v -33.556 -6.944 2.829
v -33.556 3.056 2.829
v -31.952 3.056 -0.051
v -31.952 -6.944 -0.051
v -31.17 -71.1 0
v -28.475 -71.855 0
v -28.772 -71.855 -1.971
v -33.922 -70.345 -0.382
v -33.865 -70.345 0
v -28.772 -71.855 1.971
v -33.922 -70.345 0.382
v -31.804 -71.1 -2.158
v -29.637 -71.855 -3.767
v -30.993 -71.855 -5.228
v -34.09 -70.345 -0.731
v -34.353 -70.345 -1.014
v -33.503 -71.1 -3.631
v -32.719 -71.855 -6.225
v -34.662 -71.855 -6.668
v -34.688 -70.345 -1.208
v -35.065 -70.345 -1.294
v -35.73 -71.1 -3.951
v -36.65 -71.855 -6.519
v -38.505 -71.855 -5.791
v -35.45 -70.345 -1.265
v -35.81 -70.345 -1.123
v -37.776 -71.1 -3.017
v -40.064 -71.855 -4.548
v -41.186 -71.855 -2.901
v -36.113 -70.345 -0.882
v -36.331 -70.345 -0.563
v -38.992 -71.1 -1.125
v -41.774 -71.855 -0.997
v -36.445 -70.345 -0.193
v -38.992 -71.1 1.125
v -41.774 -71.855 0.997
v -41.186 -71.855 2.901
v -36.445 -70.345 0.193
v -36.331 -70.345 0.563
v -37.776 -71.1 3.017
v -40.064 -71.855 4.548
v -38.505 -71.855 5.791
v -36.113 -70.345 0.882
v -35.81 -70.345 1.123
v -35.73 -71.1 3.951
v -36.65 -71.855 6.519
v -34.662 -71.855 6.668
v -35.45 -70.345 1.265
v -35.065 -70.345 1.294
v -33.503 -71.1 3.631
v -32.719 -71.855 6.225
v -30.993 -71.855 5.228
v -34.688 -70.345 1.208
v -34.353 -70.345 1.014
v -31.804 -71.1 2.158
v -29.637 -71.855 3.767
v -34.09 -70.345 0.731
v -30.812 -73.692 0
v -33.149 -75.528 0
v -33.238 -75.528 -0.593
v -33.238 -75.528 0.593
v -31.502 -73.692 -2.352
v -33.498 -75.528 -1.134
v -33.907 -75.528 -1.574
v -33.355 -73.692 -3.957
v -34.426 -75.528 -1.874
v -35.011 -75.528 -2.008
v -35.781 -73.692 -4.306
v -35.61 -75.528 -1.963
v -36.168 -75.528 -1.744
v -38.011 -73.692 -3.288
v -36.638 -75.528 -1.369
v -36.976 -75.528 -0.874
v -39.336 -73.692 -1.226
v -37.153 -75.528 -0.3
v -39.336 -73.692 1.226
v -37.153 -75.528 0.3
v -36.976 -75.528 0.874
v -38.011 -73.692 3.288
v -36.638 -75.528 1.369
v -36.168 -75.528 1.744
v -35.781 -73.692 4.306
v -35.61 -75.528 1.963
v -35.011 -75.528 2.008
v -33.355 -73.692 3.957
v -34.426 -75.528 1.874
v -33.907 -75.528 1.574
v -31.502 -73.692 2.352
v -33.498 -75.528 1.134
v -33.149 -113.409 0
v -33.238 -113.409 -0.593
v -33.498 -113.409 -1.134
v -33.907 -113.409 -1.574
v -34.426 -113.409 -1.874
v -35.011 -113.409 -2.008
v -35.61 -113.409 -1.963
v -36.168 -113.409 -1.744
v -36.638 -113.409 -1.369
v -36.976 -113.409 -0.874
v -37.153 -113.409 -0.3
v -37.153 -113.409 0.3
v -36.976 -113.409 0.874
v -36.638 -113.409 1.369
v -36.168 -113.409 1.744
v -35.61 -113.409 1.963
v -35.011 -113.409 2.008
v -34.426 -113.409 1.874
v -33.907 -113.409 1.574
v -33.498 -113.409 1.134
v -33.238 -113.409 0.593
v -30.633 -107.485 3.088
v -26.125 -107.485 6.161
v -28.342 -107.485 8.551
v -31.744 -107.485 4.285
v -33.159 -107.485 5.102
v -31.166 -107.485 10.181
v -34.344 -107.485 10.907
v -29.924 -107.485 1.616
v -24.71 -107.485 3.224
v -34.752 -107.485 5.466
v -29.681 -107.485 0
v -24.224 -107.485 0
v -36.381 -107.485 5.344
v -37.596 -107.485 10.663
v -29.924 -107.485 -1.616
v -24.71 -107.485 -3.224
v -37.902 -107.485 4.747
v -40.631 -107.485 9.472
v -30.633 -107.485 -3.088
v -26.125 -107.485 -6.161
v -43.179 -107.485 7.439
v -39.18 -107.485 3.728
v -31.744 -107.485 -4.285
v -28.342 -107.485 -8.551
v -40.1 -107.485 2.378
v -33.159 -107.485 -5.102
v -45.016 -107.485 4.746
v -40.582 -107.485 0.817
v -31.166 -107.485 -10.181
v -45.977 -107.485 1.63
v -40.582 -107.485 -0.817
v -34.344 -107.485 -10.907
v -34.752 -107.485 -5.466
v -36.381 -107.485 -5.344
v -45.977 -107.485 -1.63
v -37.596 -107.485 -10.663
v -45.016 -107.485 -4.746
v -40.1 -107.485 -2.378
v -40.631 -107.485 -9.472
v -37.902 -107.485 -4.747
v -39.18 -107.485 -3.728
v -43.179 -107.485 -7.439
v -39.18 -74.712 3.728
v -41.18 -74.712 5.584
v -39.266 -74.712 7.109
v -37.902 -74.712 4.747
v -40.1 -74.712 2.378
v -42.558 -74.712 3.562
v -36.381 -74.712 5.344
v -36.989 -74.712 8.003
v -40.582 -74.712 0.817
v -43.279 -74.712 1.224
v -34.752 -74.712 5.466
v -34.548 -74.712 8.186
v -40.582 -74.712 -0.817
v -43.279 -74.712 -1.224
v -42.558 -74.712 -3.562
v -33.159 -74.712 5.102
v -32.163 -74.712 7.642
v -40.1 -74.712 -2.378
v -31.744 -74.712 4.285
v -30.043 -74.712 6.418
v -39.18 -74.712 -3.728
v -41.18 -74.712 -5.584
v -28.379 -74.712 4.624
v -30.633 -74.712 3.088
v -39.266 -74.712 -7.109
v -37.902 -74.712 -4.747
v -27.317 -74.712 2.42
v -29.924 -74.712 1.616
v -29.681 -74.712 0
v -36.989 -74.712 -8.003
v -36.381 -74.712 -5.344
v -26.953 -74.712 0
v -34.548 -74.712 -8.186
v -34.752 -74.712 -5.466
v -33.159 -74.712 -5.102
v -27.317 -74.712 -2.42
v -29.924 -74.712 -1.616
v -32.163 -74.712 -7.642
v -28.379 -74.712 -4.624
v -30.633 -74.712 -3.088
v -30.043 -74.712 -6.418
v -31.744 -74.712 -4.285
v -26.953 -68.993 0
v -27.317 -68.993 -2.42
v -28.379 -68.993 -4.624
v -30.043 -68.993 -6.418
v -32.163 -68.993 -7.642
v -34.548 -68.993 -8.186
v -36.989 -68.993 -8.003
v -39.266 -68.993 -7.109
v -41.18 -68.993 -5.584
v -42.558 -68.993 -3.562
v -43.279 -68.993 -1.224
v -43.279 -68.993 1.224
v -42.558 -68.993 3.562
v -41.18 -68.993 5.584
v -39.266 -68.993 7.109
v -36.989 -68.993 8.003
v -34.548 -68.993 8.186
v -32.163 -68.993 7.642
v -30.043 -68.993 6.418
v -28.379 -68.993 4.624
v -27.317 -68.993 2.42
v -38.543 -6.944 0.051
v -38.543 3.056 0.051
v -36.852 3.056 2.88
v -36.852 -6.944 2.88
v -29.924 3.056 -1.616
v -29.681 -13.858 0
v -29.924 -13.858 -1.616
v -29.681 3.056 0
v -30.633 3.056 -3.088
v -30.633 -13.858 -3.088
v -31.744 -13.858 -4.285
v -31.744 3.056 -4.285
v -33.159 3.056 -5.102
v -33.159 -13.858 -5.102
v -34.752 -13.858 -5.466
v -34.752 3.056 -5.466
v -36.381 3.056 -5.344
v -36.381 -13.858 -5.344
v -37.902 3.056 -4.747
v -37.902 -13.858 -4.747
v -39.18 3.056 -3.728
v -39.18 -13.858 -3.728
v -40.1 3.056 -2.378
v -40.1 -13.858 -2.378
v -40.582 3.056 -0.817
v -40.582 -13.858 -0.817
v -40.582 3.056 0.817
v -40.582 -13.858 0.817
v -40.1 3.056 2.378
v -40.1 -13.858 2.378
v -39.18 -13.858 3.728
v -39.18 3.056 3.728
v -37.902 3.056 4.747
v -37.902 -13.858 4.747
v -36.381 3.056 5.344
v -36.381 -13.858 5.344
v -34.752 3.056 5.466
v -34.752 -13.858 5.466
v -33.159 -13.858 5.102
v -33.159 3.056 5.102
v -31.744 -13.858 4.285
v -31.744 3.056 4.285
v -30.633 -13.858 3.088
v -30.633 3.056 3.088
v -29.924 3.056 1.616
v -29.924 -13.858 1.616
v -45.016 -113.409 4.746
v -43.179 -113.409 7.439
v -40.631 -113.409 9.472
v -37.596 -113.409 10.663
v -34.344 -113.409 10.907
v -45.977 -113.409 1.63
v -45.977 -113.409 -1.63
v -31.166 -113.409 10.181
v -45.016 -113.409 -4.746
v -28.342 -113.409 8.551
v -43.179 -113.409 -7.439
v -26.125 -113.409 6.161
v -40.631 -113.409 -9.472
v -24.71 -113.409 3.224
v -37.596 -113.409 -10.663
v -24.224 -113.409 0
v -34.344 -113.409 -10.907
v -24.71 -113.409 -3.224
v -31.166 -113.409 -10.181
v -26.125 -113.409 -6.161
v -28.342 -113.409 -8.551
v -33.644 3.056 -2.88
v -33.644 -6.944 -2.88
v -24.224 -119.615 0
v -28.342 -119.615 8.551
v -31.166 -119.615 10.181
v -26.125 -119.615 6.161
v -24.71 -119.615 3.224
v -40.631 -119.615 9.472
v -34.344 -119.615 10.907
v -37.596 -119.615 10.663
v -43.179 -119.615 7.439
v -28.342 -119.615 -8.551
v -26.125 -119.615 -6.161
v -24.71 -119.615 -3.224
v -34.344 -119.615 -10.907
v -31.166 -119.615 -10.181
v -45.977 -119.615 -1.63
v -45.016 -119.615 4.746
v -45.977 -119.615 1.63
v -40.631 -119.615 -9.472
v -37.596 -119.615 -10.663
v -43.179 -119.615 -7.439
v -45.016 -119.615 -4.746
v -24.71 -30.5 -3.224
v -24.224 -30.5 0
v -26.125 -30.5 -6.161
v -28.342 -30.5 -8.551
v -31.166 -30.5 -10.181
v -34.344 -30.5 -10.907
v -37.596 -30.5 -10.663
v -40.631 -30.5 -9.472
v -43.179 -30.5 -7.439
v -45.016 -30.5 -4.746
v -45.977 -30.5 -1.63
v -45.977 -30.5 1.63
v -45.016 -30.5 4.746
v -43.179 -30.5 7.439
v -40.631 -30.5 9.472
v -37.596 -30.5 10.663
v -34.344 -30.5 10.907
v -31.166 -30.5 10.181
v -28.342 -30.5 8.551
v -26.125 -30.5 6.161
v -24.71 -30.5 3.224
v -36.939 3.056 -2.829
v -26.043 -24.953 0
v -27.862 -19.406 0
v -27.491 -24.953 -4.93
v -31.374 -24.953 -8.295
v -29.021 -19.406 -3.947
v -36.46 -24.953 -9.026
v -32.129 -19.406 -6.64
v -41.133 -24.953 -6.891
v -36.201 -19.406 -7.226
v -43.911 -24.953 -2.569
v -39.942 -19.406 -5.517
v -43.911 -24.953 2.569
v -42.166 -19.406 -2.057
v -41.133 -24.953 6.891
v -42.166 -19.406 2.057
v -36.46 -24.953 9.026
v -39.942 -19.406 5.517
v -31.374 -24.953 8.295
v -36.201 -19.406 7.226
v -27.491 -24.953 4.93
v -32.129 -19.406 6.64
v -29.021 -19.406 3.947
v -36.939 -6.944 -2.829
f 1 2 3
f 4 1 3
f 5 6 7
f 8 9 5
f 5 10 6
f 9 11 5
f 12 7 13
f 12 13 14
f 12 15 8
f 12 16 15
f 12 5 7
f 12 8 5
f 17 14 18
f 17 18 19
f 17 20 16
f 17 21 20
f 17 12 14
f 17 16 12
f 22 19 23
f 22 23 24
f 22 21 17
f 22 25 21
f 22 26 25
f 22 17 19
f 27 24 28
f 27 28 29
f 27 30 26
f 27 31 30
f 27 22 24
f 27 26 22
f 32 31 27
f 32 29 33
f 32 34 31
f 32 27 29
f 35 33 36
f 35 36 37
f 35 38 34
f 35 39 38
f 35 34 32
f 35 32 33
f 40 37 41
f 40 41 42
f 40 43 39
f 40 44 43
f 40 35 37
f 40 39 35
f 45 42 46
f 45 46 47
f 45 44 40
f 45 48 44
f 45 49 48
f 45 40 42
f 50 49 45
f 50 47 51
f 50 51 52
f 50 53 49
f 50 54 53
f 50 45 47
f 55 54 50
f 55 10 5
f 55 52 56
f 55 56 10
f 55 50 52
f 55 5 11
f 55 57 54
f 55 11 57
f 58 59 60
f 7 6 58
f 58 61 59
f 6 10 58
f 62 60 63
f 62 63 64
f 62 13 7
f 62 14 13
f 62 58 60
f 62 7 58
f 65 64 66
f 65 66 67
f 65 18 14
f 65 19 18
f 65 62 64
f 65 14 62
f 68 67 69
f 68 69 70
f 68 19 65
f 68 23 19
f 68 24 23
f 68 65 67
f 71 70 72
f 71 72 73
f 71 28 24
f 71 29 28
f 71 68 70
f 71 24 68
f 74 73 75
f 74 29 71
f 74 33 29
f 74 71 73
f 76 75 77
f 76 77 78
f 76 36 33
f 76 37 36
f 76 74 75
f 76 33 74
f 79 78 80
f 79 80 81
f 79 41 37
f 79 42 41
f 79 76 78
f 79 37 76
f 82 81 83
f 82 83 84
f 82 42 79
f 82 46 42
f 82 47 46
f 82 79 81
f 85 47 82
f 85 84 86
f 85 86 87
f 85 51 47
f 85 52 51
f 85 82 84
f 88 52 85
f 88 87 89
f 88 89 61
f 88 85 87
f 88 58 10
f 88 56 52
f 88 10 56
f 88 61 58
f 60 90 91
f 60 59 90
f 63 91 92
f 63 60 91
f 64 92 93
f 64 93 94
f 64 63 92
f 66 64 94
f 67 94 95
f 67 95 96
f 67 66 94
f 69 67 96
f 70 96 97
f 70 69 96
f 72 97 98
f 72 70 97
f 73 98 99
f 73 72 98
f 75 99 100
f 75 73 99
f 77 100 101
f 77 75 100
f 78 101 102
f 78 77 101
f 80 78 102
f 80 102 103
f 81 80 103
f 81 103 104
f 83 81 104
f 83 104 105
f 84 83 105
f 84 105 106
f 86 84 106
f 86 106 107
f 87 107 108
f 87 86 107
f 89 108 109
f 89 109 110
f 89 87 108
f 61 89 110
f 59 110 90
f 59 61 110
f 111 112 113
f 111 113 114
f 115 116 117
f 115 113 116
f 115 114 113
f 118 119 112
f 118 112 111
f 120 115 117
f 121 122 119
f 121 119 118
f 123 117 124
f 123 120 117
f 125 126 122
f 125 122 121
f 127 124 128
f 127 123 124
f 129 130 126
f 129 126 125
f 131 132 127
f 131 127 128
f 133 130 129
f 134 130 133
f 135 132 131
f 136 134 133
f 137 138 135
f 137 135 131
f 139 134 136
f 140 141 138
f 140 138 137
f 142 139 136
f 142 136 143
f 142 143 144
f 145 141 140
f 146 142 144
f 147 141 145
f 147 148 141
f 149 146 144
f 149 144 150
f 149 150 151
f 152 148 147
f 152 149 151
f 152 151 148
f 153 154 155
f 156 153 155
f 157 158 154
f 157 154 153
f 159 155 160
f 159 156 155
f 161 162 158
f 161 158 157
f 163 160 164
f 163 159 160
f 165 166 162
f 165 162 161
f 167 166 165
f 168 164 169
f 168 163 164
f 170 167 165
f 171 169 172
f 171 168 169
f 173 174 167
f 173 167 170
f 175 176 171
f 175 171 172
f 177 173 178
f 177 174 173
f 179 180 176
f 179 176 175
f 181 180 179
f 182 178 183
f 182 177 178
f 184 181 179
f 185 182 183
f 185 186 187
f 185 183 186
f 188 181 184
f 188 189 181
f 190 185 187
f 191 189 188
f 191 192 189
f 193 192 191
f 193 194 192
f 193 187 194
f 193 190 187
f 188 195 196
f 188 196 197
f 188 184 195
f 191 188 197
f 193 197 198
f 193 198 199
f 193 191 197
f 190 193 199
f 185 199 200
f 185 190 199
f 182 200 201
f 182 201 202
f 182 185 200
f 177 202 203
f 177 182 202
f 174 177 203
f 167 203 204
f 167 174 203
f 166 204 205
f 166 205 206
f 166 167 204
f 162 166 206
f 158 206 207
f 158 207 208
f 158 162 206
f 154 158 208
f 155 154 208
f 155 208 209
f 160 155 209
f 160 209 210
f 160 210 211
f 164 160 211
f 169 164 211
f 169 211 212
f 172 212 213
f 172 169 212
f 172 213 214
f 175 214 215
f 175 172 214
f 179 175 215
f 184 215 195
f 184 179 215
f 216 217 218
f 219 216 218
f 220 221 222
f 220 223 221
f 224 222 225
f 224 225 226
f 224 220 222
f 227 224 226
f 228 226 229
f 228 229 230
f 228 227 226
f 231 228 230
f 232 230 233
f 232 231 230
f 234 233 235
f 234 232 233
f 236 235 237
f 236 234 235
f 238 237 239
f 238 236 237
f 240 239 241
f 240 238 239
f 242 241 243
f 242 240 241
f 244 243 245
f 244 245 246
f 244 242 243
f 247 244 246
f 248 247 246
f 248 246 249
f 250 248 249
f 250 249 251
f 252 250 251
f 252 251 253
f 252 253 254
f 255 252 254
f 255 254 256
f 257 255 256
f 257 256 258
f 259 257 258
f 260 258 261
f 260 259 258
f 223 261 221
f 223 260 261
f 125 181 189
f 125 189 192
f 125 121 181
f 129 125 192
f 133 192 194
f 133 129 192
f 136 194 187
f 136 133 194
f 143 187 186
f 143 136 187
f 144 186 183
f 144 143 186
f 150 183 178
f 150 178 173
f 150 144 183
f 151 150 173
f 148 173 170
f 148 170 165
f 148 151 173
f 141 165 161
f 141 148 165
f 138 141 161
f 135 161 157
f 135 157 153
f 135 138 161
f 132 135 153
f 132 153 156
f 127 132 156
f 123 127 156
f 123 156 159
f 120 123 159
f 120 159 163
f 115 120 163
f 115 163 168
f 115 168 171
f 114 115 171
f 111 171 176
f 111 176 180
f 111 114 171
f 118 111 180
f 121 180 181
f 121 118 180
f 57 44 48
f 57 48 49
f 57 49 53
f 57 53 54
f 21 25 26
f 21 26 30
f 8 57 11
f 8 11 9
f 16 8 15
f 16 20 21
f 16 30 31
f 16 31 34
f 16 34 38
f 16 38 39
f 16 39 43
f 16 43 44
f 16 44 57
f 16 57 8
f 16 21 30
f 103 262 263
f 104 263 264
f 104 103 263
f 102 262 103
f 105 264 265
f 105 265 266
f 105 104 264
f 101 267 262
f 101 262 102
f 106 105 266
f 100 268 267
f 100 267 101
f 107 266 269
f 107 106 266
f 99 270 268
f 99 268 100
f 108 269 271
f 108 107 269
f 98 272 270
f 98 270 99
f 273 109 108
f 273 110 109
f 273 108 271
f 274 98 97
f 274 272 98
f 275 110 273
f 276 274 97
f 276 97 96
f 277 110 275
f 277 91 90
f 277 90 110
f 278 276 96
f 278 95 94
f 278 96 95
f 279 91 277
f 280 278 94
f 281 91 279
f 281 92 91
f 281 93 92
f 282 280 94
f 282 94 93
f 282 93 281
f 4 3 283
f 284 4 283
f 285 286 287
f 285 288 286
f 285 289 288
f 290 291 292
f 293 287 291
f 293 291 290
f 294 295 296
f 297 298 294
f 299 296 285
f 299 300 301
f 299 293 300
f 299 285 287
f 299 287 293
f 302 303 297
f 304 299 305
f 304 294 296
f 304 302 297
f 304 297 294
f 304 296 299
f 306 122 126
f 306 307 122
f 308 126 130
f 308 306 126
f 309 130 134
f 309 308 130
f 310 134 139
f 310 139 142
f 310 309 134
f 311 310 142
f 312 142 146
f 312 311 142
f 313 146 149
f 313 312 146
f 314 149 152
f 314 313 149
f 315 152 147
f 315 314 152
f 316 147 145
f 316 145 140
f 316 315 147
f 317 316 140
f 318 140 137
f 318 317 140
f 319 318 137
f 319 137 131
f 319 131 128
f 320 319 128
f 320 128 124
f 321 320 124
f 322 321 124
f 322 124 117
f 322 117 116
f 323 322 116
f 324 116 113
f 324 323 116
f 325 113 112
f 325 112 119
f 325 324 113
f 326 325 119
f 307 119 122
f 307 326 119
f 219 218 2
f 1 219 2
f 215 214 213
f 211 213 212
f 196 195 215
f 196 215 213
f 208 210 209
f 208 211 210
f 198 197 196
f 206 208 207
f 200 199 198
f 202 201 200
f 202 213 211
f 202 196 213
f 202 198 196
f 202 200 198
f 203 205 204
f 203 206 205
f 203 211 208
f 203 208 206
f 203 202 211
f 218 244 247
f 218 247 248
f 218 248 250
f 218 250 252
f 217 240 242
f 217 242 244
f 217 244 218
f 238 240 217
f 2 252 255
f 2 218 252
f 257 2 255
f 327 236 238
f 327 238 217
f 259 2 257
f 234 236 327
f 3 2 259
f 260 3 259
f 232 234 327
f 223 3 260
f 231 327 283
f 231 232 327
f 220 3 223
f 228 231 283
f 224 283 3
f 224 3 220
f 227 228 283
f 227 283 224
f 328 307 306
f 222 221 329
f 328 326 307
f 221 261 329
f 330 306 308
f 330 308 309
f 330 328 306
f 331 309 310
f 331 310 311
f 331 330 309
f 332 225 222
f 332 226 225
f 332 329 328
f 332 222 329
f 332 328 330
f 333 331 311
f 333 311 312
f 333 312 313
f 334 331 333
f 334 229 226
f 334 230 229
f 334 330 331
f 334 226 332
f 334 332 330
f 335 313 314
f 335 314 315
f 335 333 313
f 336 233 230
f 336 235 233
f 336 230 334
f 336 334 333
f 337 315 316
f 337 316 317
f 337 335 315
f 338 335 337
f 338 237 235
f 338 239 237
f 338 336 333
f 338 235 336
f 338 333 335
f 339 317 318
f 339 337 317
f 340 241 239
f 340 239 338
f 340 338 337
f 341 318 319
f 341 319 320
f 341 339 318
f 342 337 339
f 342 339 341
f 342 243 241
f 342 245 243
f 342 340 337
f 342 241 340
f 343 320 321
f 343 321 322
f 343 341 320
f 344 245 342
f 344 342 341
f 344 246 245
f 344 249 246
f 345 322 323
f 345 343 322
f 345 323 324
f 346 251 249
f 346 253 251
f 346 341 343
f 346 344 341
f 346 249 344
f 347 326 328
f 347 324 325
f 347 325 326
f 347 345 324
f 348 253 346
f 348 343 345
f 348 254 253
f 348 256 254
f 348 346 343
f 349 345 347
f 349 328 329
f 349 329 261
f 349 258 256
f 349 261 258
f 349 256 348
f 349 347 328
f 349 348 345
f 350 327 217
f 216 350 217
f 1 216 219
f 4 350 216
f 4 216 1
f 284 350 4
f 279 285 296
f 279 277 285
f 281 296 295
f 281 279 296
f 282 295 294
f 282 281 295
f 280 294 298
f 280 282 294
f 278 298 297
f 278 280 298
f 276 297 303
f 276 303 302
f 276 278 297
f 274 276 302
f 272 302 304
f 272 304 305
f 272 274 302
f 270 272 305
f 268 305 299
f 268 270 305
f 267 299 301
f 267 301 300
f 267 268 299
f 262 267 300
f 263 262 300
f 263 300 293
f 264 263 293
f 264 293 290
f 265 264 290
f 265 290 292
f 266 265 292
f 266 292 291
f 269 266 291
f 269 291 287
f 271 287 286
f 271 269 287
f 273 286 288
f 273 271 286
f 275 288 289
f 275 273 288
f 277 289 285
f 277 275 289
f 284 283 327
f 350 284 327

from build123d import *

# Parameters (mm, degrees)
CUT_EXTRUDE1_DEPTH = 10


# Read off the part's stored shape, not the designer's step: Revolve1
with BuildPart() as part:
    # Revolve1 outline → Revolve1 (revolve)
    with BuildSketch(Plane(origin=(-35.161827578, 0, 0), x_dir=(1, 0, 0), z_dir=(0, 0, 1))):
        Polygon((1.297264634, -70.345356918), (0, -70.345356918), (0, -119.615434084), (10.937375972, -119.615434084), (10.937375972, -113.408967551), (2.013315504, -113.408967551), (2.013315504, -75.528254618), (6.68680257, -71.855437745), align=None)
        Polygon((0, 3.056095738), (0, -68.992528566), (8.209241058, -68.992528566), (8.209241058, -74.711892348), (5.481106144, -74.711892348), (5.481106144, -107.485093425), (10.937375972, -107.485093425), (10.937375972, -30.499963707), (5.481106144, -13.85834073), (5.481106144, 3.056095738), align=None)
    revolve(axis=Axis((-35.161827578, 0, 0), (0, 1, 0)))

    # Sketch2 → Cut-Extrude1 (cut)
    with BuildSketch(Plane(origin=(0, 3.056095738, 0), x_dir=(1, 0, 0), z_dir=(0, 1, 0))):
        Polygon((-33.555887845, -2.828831335), (-31.951942031, 0.050715693), (-33.643730001, 2.879547028), (-36.939463785, 2.828831335), (-38.543409599, -0.050715693), (-36.851621629, -2.879547028), align=None)
    extrude(amount=-CUT_EXTRUDE1_DEPTH, mode=Mode.SUBTRACT)


solid = part.part
